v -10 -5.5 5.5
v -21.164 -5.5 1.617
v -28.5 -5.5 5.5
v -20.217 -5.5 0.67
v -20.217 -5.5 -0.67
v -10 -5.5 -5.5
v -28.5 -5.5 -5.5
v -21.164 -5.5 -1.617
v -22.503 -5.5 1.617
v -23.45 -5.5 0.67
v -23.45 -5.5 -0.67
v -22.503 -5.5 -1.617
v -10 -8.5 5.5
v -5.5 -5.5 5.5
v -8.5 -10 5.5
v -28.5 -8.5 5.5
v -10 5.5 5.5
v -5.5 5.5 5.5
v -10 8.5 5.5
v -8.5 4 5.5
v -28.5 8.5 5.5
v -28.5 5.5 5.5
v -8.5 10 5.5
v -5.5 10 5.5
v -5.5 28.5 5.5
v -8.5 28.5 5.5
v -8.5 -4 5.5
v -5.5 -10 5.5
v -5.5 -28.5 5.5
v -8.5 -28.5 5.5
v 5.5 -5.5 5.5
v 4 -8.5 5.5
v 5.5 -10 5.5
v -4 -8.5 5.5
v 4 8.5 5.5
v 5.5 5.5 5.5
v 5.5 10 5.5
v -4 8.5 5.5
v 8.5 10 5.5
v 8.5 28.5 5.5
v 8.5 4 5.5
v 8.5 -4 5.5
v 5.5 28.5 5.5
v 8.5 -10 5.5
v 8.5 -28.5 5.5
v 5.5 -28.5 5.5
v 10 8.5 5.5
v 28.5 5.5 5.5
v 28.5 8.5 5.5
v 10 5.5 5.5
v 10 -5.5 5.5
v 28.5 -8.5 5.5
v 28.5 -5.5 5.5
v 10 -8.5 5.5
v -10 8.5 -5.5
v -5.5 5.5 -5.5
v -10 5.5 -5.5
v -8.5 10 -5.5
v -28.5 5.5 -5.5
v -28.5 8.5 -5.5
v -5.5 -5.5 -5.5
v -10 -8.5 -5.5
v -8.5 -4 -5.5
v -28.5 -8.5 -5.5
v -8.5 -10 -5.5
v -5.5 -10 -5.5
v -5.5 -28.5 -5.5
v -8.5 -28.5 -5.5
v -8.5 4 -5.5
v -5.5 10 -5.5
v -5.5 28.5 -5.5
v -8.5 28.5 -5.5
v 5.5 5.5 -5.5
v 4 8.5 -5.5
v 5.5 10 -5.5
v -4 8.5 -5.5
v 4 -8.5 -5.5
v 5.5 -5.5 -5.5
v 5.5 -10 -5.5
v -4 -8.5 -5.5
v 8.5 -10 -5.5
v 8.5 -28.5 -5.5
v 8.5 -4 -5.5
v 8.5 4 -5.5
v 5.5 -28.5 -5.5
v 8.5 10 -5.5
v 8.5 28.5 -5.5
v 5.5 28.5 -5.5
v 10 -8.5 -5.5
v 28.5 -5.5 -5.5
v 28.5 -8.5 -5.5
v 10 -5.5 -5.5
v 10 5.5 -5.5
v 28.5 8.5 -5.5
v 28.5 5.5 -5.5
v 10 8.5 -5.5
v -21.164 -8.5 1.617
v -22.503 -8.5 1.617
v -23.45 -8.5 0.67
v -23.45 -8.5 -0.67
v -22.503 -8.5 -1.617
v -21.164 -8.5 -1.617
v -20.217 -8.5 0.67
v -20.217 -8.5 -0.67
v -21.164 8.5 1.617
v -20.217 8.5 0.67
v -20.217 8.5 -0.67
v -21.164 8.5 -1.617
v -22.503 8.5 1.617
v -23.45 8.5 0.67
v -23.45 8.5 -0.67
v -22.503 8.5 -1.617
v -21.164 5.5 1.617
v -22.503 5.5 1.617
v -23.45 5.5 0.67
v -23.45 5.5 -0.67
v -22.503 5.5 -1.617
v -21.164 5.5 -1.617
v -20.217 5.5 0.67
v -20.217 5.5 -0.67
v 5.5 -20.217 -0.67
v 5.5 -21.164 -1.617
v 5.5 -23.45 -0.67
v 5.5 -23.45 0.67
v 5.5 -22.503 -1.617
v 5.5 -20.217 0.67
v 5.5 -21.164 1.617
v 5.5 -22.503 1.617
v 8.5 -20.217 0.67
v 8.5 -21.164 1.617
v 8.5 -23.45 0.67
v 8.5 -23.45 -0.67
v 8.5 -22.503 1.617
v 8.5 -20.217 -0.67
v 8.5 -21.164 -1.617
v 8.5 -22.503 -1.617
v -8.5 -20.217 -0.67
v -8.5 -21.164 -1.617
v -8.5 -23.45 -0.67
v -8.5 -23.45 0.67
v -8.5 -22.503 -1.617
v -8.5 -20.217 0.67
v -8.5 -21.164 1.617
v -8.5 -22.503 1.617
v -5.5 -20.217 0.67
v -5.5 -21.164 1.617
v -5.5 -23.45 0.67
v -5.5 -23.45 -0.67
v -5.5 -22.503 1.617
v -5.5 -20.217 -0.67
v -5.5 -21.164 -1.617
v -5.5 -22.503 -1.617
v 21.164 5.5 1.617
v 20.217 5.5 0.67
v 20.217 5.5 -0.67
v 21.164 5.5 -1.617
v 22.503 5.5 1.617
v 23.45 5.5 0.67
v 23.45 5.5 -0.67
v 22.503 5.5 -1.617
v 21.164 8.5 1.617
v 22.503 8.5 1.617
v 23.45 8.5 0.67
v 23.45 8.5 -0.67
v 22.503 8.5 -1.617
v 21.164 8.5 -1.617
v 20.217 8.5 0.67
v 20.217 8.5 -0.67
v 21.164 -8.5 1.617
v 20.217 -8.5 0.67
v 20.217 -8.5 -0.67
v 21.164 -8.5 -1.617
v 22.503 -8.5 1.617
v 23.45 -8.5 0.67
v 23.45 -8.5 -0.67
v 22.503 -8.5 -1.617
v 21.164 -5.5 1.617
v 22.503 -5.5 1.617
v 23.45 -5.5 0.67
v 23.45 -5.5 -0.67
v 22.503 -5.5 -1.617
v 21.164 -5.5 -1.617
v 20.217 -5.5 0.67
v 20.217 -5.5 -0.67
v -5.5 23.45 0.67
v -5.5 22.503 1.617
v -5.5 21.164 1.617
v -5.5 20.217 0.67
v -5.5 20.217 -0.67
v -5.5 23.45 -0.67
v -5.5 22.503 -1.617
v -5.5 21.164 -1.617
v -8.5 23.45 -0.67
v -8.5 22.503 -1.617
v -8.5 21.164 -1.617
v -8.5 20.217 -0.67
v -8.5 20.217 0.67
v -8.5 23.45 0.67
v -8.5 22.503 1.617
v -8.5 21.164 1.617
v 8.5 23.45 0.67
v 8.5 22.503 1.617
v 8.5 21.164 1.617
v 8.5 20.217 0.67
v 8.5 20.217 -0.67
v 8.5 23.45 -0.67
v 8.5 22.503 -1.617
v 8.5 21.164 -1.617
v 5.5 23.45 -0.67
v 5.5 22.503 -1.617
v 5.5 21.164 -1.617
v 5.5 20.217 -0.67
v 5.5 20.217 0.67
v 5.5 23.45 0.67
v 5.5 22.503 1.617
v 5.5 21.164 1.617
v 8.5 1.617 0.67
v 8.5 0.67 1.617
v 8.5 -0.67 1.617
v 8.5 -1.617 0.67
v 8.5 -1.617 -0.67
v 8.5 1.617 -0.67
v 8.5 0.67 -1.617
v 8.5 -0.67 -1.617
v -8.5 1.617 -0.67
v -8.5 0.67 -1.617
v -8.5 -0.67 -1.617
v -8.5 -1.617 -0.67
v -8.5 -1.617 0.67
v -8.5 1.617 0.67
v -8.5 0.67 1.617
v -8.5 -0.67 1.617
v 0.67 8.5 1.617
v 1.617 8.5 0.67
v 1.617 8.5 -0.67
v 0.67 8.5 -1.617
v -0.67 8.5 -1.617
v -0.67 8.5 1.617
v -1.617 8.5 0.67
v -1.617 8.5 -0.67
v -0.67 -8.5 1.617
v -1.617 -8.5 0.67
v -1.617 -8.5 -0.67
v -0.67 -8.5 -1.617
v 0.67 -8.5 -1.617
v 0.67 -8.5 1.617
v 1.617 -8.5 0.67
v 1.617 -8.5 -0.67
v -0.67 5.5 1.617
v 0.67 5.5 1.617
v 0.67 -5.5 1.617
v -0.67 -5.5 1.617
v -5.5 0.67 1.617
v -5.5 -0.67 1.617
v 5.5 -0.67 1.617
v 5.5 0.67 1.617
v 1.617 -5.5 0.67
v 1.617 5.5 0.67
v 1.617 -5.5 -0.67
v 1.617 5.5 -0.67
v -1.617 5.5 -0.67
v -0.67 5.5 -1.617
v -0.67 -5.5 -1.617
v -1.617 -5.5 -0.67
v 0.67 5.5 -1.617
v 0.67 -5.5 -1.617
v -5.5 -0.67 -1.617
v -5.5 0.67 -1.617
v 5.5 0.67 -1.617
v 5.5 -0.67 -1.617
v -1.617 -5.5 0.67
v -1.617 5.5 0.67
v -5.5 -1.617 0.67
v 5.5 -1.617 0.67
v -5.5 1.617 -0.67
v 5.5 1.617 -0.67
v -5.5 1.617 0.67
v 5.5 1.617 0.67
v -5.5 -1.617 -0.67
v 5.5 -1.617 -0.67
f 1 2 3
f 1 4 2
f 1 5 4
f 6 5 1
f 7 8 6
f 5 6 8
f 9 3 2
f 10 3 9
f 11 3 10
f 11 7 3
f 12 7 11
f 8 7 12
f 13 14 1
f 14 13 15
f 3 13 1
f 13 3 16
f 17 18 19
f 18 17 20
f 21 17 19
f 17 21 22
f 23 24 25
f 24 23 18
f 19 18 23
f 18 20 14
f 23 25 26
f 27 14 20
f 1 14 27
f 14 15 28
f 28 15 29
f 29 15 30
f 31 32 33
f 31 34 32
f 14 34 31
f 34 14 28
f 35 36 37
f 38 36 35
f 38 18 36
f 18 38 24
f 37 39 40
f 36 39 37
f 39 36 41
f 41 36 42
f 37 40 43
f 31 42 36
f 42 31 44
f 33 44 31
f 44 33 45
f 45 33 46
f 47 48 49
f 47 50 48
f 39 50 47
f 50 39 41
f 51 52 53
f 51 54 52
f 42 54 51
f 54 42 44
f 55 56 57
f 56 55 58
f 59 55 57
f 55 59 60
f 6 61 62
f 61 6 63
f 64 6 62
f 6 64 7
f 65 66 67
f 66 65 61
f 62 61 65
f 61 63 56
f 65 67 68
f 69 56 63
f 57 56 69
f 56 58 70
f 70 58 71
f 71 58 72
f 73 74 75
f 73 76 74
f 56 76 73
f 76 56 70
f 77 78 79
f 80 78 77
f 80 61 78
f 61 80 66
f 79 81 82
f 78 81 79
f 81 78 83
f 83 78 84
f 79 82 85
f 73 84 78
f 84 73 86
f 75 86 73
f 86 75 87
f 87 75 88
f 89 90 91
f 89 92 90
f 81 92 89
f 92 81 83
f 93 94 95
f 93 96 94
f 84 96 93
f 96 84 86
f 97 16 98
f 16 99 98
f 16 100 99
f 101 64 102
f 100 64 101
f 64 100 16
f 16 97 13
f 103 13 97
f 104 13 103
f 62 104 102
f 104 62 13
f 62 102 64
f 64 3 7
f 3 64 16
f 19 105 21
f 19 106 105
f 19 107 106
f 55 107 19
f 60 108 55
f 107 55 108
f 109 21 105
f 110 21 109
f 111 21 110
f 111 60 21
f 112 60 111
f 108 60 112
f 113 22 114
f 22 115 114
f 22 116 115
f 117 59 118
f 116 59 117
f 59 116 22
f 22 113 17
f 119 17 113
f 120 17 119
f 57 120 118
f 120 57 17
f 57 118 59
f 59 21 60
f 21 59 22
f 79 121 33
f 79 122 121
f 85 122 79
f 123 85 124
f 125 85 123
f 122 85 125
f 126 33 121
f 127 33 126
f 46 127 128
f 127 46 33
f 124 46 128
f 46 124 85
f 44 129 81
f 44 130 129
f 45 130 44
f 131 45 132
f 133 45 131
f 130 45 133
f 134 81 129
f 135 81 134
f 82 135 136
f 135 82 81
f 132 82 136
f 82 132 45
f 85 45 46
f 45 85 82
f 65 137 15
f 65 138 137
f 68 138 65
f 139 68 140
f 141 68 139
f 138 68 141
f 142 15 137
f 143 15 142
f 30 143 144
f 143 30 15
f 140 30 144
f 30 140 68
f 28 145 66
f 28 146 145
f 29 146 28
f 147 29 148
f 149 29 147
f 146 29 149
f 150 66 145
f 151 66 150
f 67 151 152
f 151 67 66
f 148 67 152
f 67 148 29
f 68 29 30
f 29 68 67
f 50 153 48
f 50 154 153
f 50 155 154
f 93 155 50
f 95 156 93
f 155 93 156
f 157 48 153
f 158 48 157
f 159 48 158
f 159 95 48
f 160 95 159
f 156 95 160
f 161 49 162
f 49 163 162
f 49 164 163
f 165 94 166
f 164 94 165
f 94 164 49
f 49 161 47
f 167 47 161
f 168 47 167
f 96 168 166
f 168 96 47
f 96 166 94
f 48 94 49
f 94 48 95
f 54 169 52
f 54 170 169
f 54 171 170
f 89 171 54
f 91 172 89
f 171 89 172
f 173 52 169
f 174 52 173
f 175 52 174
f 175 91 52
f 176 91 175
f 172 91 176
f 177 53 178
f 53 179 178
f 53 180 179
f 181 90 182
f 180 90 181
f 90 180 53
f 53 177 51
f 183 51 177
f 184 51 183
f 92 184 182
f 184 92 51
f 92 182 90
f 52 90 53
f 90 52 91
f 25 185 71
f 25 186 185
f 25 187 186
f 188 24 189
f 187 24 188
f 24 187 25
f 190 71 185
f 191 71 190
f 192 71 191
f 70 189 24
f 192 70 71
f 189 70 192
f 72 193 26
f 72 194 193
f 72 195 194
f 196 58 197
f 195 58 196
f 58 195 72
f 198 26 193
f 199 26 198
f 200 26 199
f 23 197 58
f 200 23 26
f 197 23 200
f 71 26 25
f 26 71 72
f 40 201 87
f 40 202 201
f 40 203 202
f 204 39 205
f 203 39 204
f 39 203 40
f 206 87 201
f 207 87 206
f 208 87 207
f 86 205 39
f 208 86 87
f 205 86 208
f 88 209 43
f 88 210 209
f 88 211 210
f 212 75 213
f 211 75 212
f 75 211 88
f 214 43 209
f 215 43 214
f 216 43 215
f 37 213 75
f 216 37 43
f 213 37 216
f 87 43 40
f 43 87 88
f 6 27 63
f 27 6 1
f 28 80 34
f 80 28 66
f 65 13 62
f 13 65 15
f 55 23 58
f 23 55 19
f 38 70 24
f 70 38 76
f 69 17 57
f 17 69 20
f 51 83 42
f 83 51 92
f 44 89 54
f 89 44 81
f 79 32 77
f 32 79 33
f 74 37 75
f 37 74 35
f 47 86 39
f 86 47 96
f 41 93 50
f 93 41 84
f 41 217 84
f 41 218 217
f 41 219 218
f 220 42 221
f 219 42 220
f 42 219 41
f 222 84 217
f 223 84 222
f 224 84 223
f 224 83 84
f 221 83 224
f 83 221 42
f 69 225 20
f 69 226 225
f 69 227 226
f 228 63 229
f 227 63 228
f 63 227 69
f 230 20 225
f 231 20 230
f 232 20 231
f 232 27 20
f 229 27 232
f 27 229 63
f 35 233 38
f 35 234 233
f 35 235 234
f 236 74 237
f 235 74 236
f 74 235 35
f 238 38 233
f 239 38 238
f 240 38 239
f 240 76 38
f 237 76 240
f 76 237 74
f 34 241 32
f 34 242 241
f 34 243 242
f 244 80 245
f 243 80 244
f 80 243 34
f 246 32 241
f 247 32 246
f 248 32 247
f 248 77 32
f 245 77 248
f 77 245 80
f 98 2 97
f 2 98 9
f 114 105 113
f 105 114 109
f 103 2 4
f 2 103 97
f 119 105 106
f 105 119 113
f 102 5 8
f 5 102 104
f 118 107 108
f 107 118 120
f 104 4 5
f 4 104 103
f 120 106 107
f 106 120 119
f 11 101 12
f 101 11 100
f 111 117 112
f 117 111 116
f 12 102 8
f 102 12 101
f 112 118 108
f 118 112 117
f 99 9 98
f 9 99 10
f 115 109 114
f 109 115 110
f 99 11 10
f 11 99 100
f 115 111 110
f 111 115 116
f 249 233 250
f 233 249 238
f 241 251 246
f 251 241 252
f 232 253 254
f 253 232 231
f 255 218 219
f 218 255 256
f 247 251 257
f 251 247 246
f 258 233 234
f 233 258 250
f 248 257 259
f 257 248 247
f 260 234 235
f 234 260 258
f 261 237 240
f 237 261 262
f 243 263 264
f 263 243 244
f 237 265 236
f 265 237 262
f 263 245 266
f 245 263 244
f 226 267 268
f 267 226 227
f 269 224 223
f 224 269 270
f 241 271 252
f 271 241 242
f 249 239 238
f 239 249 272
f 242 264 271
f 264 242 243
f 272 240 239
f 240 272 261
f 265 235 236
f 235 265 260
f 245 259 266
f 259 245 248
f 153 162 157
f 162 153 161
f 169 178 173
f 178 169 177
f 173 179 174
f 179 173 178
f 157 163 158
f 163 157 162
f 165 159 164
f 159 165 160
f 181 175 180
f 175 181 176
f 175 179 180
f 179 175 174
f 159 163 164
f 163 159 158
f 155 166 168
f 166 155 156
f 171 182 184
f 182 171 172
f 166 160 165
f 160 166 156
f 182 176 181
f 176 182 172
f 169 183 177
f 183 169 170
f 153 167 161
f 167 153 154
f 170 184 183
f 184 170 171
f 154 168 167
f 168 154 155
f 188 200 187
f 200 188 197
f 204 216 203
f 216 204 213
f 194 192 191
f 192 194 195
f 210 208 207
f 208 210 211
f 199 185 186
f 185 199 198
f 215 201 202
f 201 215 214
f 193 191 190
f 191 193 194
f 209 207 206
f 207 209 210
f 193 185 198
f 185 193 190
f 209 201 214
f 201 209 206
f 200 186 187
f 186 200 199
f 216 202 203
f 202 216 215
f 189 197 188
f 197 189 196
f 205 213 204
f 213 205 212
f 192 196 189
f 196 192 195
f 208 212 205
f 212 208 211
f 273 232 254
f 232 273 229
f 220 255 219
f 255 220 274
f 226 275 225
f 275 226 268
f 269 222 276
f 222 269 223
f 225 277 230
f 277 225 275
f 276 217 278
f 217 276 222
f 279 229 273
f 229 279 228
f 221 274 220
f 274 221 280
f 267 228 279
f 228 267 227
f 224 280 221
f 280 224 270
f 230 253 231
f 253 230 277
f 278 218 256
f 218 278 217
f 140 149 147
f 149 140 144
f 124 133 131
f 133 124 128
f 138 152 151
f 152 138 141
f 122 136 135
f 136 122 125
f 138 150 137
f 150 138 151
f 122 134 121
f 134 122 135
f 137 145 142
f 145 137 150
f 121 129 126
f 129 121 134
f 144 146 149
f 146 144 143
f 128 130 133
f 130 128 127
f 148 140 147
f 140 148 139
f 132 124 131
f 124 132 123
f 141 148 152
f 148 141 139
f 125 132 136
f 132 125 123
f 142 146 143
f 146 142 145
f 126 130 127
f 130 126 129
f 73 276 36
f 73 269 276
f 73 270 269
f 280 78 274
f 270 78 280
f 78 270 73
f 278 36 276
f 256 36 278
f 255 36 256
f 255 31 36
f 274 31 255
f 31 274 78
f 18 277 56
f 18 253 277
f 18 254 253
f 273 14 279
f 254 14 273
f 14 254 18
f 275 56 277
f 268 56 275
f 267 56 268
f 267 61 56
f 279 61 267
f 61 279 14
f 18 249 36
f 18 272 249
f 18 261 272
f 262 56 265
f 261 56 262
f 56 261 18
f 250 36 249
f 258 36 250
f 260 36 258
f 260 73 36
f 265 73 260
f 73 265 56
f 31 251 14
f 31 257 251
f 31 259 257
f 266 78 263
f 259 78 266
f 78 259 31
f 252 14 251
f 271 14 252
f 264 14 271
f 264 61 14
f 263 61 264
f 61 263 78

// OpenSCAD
// beam width
w = 11;

// beam support length
l = 20;

// hole diameter
p = 3.5;

// material thickness
t = 3;

// 3 or 4 way joint
n = 4; // [ 2, 3, 4 ]

$fn = 8;


difference()
{
	union()
	{
		for ( z = [ 1 : n ] ) rz( z * 90 )
			for ( x = [ -1, +1 ] )
				txy( x*( t/2 + w/2 ), l/2 + w/2 + t )
					cbox( t, l, w );

		for ( a = [ -1, +1 ], b = [ -1, +1 ] )
			txy( a*w/2+a*t/2, b*w/2+b*t/2 )
				ccyl( r = t*1.5, h = w, $fn = 4 );

		cbox( w+t+t, w+t+t, w );
	}

	for ( a = [ -1, 0, +1 ] )
		tx( a*( l/3*2 + w/2 + t ) )
			rx( 90 )
				rz( 180/8 )
					ccyl( r = p/2, h = w+t*3 );

	for ( a = [ +1, 0, -1 ] )
		ty( a*( l/3*2 + w/2 + t ) )
			ry( 90 )
				rz( 180/8 )
					ccyl( r = p/2, h = w+t*3 );

	cbox( w, w, w*2 );
}


/// lazy.scad 1.2
/// a collection of useful macros for the lazy OpenSCAD programmer
/// http://www.thingiverse.com/thing:512443
// single axis translations
module tx( x ) translate( [ x, 0, 0 ] ) for(c=[0:$children-1])child(c);
module ty( y ) translate( [ 0, y, 0 ] ) for(c=[0:$children-1])child(c);
module tz( z ) translate( [ 0, 0, z ] ) for(c=[0:$children-1])child(c);
// 2d translations
module txy( x, y ) translate( [ x, y, 0 ] ) for(c=[0:$children-1])child(c);
module tyz( y, z ) translate( [ 0, y, z ] ) for(c=[0:$children-1])child(c);
module txz( x, z ) translate( [ x, 0, z ] ) for(c=[0:$children-1])child(c);
// 3d translation
module txyz( x, y, z ) translate( [ x, y, z ] ) for(c=[0:$children-1])child(c);
// single axis rotations
module rx( a ) rotate( [ a, 0, 0 ] ) for(c=[0:$children-1])child(c);
module ry( a ) rotate( [ 0, a, 0 ] ) for(c=[0:$children-1])child(c);
module rz( a ) rotate( [ 0, 0, a ] ) for(c=[0:$children-1])child(c);
// centered box (cube)
module cbox( x, y, z, t, xyz ) assign( s = (xyz==undef?[x,y,z]:xyz) ) if ( t == undef || t == 0 ) cube( s, center = true ); else difference() { cbox( xyz = (t>0?s:s-2*[t,t,t]) ); cbox( xyz = (t>0?s-2*[t,t,t]:s) ); }
// centered cylinder
module ccyl( d, h, d1, d2, r, r1, r2 )
cylinder( h = h, r = ( d == undef ? r : d/2 ), r1 = ( d1 == undef ? r1 : d1/2 ), r2 = ( d2 == undef ? r2 : d2 / 2 ), center = true );
/// end lazy.scad
